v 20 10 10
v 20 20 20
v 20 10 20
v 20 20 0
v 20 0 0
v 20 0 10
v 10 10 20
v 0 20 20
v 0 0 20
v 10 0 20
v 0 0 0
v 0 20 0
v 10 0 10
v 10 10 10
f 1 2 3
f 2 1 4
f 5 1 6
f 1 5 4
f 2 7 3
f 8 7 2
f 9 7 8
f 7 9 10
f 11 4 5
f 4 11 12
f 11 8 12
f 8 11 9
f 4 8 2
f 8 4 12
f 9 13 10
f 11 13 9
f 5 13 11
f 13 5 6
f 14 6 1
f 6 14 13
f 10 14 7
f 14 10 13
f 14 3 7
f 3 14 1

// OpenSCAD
difference() {
    cube(20);
    translate([10,0,10]){
    cube(10);
    }
}
